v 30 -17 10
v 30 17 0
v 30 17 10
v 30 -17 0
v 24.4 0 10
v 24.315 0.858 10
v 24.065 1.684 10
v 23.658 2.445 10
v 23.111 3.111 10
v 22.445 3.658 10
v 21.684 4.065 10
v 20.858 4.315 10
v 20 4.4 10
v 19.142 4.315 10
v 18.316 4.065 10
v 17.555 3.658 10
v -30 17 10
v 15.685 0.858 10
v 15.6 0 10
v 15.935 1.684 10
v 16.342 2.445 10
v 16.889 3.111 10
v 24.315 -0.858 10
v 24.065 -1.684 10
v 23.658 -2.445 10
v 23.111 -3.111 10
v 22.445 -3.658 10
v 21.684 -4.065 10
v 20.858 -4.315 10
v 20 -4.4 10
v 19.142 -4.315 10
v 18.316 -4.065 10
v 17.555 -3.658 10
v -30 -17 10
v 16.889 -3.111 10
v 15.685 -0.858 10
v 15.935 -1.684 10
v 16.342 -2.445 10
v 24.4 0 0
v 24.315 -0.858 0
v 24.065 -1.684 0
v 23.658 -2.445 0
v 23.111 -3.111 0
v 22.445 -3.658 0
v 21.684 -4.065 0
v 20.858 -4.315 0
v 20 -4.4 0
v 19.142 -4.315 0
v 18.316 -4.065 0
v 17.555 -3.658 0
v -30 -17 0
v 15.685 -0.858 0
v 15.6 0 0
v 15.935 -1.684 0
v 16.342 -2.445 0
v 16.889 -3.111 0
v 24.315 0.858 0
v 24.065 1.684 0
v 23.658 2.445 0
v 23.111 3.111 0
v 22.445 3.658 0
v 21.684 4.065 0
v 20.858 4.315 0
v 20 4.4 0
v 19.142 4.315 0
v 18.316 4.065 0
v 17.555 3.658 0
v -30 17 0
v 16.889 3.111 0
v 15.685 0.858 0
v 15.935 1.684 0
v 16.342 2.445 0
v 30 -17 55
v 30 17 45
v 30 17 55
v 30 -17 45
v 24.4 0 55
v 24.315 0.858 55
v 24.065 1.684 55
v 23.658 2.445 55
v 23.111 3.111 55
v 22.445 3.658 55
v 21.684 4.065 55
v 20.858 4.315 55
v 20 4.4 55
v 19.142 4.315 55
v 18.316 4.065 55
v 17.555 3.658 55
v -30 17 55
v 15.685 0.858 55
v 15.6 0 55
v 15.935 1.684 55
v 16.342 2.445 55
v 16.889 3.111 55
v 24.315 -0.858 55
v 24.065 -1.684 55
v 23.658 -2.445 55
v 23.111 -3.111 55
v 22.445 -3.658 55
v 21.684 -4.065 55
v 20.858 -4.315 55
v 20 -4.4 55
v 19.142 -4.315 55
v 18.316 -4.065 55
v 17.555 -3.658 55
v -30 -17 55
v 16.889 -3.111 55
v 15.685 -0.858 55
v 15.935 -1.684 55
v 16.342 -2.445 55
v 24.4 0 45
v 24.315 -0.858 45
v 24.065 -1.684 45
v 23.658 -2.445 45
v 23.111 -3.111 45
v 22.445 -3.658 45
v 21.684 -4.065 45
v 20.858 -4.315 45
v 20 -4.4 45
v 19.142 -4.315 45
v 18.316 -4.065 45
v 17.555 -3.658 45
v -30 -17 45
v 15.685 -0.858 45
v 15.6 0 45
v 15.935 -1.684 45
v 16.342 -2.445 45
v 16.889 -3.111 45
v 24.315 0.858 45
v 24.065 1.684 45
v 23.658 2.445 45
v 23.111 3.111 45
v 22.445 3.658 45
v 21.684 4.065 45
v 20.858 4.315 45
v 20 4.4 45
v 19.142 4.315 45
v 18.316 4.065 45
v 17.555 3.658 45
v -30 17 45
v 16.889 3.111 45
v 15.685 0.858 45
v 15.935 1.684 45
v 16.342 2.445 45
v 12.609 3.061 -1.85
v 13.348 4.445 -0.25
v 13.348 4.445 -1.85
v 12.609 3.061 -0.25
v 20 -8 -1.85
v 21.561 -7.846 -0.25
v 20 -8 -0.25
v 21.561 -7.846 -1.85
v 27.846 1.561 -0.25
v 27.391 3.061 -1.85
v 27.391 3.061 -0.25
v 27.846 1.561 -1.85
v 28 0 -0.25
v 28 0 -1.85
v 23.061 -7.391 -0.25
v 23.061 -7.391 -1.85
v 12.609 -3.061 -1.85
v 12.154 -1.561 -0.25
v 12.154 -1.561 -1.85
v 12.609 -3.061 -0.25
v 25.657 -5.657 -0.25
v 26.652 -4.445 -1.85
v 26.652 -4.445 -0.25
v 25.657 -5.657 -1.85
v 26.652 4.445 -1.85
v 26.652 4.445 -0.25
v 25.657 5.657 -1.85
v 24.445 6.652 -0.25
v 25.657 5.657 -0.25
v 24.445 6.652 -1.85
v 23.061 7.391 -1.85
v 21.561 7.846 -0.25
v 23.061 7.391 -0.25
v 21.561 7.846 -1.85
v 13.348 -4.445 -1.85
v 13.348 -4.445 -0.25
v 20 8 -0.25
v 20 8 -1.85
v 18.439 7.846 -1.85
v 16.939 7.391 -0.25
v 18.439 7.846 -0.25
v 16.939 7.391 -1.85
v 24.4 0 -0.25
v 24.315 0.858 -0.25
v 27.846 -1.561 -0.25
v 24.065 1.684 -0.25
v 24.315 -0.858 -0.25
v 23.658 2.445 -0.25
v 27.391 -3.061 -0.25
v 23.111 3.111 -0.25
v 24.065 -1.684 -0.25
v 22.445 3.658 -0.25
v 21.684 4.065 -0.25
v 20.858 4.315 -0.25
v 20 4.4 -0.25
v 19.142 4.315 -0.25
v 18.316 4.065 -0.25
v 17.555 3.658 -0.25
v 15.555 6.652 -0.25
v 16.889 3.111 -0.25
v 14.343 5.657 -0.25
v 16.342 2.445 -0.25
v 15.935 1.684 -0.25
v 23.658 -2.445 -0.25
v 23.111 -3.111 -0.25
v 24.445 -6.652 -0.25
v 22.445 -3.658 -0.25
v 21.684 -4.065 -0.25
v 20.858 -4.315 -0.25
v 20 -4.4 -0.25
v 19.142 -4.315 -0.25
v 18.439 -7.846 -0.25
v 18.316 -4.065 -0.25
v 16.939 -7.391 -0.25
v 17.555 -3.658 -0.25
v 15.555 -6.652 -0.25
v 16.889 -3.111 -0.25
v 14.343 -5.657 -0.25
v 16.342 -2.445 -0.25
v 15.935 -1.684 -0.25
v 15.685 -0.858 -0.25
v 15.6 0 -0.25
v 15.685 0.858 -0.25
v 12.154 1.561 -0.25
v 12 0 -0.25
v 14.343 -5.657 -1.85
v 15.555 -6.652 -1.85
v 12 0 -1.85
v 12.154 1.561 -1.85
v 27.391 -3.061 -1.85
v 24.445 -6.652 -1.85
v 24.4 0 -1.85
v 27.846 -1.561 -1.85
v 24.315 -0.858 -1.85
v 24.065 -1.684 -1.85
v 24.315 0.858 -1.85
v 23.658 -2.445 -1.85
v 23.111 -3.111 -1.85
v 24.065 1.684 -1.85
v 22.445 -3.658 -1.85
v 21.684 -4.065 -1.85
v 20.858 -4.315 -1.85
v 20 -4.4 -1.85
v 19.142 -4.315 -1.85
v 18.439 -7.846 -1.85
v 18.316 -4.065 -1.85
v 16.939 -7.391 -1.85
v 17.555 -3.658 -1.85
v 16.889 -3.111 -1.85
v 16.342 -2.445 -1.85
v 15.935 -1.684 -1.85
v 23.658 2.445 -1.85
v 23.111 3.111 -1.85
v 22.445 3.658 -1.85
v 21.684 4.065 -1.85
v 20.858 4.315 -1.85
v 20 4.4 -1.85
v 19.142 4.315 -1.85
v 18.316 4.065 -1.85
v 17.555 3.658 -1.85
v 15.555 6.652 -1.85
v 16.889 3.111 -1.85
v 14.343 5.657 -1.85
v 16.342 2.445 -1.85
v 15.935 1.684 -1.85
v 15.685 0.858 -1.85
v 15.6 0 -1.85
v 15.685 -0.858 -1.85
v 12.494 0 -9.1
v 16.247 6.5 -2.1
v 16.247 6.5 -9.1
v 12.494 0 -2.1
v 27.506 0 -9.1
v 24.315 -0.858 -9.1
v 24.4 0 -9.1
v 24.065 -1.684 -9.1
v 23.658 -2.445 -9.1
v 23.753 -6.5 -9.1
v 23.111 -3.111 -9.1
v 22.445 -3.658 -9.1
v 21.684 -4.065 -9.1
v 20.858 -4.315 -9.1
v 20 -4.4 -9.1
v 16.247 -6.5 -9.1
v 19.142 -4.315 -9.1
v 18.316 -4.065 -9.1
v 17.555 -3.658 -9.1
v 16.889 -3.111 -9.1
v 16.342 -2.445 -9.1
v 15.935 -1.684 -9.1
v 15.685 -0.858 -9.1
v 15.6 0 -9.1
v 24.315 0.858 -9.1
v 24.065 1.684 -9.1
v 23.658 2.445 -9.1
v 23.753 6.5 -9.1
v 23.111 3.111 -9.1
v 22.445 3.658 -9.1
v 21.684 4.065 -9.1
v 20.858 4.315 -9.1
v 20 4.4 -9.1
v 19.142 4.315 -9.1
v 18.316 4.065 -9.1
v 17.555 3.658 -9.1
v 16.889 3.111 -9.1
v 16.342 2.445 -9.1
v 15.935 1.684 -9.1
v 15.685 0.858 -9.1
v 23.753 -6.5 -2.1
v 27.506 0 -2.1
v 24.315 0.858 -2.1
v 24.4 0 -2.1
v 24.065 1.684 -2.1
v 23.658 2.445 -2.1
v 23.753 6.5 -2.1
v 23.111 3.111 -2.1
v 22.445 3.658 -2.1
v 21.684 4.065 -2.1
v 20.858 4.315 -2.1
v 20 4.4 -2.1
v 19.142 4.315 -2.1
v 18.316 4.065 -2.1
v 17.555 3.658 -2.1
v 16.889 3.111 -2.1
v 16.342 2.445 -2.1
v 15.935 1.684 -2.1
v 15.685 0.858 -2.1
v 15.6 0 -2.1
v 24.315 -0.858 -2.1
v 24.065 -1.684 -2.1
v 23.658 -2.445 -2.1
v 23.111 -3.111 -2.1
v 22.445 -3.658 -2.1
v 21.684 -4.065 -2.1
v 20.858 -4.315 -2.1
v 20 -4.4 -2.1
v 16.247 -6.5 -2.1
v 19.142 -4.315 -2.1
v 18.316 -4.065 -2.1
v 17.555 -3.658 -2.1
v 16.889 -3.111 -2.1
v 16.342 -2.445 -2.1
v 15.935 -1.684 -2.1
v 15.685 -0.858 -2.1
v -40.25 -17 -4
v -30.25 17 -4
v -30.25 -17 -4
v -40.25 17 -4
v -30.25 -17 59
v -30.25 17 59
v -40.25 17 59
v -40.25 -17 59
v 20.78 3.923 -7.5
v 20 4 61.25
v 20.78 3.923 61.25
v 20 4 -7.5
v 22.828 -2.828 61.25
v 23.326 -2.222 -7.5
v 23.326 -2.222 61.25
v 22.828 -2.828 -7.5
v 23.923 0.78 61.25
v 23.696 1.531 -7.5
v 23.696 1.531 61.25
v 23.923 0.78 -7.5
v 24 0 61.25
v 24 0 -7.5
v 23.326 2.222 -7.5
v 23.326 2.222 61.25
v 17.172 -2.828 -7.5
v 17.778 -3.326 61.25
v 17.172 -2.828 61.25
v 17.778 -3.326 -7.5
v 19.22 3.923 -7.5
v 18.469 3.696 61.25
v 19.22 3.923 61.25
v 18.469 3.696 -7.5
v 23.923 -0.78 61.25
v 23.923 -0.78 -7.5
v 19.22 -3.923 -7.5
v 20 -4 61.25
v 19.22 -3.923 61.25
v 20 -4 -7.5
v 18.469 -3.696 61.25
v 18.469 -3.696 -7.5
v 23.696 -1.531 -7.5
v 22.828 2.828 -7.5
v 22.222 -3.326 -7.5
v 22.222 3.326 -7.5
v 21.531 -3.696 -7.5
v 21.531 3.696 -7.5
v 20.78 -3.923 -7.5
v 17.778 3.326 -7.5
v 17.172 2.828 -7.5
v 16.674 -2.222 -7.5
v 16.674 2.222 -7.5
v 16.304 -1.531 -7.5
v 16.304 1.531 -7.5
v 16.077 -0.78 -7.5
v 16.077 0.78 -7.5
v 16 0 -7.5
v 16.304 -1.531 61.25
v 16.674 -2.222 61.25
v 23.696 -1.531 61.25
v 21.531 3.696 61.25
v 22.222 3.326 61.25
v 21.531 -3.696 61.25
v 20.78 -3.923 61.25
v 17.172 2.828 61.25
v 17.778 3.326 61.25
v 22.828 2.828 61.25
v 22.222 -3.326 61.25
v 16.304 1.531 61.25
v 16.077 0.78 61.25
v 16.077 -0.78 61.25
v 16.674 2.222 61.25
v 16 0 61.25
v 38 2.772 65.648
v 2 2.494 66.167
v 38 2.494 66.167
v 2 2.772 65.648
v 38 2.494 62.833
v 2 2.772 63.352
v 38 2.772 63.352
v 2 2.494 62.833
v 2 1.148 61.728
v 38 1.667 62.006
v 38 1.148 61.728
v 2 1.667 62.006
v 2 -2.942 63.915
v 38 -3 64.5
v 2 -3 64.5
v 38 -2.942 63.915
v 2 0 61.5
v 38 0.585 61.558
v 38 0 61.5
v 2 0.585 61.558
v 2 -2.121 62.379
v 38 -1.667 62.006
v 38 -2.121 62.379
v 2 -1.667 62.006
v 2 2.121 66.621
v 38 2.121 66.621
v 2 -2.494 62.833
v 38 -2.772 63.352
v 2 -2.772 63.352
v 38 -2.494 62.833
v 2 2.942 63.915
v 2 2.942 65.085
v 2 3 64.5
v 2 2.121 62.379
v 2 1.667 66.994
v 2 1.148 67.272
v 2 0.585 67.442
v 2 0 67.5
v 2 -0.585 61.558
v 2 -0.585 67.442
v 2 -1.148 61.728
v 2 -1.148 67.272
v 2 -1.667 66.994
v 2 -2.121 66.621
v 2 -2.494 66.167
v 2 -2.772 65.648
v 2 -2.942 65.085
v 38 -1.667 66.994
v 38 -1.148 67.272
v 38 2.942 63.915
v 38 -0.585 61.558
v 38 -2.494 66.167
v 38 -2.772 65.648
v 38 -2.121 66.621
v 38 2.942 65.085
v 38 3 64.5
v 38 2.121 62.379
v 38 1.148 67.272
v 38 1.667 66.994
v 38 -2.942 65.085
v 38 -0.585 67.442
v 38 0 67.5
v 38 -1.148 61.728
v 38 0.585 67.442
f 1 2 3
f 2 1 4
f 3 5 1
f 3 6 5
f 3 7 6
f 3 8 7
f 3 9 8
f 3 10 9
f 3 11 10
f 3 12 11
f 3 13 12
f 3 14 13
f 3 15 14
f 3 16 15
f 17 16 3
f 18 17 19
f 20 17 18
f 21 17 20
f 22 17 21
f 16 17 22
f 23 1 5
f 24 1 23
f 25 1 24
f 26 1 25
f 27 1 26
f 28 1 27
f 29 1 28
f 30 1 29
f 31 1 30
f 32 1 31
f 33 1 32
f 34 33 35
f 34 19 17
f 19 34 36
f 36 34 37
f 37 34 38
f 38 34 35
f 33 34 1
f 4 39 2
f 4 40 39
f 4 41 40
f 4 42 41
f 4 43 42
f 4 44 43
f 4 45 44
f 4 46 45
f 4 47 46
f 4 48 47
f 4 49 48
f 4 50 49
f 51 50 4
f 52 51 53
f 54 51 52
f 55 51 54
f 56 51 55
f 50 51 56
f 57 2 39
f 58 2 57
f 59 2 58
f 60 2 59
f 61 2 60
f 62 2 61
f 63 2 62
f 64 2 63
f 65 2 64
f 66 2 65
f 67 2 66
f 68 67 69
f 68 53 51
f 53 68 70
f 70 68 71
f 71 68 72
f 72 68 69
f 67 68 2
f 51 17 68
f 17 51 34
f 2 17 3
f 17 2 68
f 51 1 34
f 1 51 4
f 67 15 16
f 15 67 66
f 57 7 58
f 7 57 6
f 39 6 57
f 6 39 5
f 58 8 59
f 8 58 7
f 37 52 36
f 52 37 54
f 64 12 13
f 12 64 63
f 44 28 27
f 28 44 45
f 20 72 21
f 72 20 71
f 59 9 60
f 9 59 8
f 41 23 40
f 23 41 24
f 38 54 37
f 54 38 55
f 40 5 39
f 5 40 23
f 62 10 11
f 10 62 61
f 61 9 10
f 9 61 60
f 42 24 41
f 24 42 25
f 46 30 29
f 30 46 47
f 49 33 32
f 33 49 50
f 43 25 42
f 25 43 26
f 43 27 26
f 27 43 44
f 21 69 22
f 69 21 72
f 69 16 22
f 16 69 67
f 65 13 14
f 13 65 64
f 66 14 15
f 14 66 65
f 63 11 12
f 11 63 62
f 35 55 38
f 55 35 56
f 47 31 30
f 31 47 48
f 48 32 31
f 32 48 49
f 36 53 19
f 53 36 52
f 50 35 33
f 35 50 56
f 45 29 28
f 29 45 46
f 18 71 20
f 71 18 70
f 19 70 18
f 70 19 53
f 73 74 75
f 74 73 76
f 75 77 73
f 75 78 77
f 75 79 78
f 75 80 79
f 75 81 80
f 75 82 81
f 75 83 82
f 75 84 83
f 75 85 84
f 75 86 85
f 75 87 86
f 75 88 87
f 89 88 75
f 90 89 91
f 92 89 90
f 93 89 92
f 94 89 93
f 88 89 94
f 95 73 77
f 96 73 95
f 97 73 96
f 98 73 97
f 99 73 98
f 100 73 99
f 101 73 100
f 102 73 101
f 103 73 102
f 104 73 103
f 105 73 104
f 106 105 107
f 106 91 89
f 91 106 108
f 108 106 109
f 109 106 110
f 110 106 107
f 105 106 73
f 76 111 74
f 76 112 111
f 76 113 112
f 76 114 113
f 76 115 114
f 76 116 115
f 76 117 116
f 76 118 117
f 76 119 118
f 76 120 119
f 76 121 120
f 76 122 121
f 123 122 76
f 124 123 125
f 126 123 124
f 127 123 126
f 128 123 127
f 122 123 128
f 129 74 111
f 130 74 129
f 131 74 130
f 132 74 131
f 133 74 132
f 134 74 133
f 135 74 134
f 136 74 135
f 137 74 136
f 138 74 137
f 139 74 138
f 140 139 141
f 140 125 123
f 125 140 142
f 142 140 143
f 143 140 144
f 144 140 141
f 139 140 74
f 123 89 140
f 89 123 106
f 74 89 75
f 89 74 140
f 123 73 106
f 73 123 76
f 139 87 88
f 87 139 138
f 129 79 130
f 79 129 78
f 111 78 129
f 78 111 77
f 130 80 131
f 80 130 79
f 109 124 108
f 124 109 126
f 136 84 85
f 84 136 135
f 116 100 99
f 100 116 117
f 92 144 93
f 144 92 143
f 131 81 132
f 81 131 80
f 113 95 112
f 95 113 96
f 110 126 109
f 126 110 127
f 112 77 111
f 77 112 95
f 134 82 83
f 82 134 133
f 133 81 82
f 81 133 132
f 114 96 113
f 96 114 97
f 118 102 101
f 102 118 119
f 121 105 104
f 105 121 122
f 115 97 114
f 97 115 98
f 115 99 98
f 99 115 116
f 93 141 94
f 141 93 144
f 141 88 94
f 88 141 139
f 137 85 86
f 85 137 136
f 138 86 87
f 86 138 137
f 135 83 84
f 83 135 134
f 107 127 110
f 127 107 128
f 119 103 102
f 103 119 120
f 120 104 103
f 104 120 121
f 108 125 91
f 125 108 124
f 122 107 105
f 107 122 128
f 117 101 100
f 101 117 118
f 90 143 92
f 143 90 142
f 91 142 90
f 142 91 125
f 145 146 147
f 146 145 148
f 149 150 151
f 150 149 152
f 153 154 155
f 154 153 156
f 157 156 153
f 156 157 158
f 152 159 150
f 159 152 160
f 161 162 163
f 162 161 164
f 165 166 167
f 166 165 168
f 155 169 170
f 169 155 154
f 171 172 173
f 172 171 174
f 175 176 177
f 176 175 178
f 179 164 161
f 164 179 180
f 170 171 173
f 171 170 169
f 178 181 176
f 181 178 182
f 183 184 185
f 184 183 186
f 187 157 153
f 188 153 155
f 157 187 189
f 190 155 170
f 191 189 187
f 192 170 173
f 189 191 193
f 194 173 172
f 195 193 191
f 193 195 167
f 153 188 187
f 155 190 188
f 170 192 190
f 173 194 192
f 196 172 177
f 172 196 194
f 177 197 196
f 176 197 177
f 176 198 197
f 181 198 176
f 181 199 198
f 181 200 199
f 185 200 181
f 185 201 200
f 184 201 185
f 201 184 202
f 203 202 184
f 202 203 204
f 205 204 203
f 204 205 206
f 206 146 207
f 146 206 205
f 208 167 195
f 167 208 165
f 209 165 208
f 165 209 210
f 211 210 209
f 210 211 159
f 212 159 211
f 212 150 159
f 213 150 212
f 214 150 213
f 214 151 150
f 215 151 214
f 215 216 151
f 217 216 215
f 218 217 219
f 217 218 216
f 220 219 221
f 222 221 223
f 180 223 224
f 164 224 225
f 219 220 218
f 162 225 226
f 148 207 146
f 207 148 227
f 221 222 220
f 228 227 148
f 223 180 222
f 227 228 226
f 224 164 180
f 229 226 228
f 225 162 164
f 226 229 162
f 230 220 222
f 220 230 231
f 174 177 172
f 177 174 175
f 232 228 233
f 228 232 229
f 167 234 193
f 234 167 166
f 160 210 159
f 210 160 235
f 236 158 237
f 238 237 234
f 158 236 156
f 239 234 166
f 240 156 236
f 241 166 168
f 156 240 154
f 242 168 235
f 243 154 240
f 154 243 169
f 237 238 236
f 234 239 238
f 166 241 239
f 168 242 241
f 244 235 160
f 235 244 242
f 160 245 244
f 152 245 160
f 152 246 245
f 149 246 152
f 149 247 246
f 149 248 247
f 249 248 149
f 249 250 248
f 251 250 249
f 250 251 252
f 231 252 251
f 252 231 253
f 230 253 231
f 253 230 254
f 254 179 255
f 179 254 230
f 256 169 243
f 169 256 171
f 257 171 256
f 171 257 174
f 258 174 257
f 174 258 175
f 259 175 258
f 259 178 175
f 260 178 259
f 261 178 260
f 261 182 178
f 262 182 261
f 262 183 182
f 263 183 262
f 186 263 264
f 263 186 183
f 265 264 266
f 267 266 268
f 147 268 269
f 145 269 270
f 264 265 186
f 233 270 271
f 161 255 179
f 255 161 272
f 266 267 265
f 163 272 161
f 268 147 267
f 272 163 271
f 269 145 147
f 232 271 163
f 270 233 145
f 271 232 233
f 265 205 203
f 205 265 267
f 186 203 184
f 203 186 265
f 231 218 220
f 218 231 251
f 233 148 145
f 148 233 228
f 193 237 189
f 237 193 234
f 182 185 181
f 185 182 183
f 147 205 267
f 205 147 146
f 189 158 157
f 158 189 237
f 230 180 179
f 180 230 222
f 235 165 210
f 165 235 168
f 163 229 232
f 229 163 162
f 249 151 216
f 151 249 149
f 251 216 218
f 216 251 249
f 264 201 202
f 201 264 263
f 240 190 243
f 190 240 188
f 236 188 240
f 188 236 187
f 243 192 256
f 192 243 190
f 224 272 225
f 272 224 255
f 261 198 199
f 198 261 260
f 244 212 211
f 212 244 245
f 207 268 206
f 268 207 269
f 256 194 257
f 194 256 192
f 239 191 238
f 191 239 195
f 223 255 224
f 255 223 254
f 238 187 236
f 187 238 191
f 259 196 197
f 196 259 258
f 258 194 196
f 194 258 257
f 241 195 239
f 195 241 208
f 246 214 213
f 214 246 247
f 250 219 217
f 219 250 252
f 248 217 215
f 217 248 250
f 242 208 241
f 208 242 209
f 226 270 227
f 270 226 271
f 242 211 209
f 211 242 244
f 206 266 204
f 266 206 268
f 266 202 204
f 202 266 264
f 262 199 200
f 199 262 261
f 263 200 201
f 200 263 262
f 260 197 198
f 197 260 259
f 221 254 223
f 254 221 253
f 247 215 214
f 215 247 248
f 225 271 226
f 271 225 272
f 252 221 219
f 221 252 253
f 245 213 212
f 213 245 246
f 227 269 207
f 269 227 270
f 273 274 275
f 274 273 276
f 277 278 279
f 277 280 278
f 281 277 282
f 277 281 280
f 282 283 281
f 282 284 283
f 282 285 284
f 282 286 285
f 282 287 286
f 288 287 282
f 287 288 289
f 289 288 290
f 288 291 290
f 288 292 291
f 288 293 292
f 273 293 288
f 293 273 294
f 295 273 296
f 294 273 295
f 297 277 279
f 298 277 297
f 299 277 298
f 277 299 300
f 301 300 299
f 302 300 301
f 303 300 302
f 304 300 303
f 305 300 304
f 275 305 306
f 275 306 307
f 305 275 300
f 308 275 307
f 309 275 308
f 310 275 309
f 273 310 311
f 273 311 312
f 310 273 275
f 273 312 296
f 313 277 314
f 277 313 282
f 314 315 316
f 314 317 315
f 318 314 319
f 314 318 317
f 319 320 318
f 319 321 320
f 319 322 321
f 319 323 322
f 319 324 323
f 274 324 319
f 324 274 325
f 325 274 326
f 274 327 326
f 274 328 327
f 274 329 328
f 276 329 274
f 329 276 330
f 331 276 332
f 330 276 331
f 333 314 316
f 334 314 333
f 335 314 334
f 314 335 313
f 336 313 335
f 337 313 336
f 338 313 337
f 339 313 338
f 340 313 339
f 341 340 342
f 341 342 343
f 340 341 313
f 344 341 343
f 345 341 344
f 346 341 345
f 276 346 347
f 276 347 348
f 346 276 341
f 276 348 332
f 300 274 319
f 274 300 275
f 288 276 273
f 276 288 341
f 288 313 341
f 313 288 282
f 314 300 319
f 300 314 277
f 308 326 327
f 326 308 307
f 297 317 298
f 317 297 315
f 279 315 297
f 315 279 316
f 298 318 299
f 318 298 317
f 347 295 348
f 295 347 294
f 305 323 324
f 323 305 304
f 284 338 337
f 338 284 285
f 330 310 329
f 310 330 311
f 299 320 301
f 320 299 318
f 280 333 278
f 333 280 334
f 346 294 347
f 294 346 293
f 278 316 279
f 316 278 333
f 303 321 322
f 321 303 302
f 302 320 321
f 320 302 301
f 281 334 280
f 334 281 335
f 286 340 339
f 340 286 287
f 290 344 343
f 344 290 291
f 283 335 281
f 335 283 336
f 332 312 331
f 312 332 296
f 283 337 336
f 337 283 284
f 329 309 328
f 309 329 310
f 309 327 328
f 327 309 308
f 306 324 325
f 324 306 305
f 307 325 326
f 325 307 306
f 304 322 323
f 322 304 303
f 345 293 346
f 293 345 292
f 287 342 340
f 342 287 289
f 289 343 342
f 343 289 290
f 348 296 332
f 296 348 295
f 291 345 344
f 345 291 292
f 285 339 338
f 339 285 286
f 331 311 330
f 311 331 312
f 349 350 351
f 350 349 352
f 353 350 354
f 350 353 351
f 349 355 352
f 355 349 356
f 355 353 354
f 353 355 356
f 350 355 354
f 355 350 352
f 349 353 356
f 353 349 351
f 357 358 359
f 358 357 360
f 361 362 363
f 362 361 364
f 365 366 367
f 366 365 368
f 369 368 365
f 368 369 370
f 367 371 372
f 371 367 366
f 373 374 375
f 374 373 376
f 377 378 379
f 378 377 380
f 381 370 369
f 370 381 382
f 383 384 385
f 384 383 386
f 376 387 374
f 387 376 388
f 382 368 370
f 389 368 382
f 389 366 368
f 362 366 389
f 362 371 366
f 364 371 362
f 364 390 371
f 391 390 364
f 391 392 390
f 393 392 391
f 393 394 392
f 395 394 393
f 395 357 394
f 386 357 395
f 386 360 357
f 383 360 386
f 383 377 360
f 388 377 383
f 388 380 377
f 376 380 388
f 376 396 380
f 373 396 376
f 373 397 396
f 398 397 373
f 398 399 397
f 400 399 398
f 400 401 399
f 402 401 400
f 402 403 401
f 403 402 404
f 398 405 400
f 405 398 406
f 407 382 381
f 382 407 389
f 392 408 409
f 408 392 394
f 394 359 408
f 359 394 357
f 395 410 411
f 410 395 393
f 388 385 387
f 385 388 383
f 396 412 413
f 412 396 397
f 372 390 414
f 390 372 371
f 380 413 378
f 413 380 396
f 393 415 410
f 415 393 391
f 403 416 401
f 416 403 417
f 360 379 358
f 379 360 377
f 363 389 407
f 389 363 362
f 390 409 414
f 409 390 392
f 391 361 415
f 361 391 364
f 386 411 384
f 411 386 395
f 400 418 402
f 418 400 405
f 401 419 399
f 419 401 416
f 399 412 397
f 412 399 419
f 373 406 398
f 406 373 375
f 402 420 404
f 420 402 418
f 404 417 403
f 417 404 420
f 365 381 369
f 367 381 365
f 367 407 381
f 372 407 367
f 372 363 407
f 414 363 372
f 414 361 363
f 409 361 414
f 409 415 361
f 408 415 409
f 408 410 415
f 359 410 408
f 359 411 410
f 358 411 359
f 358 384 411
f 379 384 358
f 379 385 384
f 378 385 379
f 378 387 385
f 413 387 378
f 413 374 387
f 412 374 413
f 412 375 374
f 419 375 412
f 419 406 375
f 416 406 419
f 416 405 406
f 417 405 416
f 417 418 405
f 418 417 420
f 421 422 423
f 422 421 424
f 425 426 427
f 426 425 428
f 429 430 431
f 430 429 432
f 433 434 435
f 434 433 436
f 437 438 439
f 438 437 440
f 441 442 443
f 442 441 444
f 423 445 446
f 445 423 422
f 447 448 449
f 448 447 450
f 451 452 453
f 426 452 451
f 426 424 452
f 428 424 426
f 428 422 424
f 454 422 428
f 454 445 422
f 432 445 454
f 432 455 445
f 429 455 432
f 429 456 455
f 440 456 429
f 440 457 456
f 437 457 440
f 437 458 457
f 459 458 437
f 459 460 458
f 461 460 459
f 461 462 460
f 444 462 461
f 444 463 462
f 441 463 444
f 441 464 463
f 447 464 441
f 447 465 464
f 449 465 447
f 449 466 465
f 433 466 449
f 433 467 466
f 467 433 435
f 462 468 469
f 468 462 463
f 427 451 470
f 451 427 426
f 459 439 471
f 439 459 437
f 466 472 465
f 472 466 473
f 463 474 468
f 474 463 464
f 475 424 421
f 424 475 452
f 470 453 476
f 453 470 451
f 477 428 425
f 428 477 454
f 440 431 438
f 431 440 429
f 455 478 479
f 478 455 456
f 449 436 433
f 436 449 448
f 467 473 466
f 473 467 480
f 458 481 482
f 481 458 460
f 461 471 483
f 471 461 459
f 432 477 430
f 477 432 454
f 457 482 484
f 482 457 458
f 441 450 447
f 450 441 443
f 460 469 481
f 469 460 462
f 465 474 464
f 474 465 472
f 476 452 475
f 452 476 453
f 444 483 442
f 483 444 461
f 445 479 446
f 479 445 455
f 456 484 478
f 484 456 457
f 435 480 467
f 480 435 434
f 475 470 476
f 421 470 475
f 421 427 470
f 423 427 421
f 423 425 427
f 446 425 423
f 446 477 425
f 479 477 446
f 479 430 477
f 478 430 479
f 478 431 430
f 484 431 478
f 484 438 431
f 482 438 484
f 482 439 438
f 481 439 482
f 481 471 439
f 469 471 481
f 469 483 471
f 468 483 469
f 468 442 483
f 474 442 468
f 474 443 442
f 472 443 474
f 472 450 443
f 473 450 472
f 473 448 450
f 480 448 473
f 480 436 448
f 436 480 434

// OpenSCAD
$fn = 32;

// ------------------------------------------------------------------------
// C clamp: throat 45 mm, screw d8
// Every part is its own module, assembly() places every instance.
// ------------------------------------------------------------------------

// --- part 1 ---
module clamp_arm() {
  difference() {
    translate([-30, -17, 0]) cube([60, 34, 10]);
    translate([20, 0, -1]) cylinder(h = 12, d = 8.8);
  }
}

// --- part 2 ---
module clamp_spine() {
  difference() {
    translate([-31.5, -17, 0]) cube([63, 34, 10]);
  }
}

// --- part 3 ---
module clamp_screw() {
  translate([0, 0, -34.375]) cylinder(h = 68.75, d = 8);
}

// --- part 4 ---
module clamp_washer() {
  difference() {
      translate([0, 0, 0]) cylinder(h = 1.6, d = 16);
      translate([0, 0, -1]) cylinder(h = 3.6, d = 8.8);
    }
}

// --- part 5 ---
module clamp_nut() {
  difference() {
    linear_extrude(height = 7) polygon(points = [[7.506, 0], [3.753, 6.5], [-3.753, 6.5], [-7.506, 0], [-3.753, -6.5], [3.753, -6.5]]);
    translate([0, 0, -1]) cylinder(h = 9, d = 8.8);
  }
}

// --- part 6 ---
module tommy_bar() {
  translate([0, 0, -18]) cylinder(h = 36, d = 6);
}

// --- assembly ---
module assembly() {
  color([0.80, 0.24, 0.20]) translate([0, 0, 0]) rotate([0, 0, 0]) clamp_arm();
  color([0.20, 0.45, 0.75]) translate([0, 0, 45]) rotate([0, 0, 0]) clamp_arm();
  color([0.25, 0.62, 0.32]) translate([-40.25, 0, 27.5]) rotate([0, 90, 0]) clamp_spine();
  color([0.92, 0.70, 0.18]) translate([20, 0, 26.875]) rotate([0, 0, 0]) clamp_screw();
  color([0.58, 0.35, 0.70]) translate([20, 0, -1.85]) rotate([0, 0, 0]) clamp_washer();
  color([0.16, 0.66, 0.66]) translate([20, 0, -9.1]) rotate([0, 0, 0]) clamp_nut();
  color([0.85, 0.48, 0.18]) translate([20, 0, 64.5]) rotate([0, 90, 0]) tommy_bar();
}

assembly();
